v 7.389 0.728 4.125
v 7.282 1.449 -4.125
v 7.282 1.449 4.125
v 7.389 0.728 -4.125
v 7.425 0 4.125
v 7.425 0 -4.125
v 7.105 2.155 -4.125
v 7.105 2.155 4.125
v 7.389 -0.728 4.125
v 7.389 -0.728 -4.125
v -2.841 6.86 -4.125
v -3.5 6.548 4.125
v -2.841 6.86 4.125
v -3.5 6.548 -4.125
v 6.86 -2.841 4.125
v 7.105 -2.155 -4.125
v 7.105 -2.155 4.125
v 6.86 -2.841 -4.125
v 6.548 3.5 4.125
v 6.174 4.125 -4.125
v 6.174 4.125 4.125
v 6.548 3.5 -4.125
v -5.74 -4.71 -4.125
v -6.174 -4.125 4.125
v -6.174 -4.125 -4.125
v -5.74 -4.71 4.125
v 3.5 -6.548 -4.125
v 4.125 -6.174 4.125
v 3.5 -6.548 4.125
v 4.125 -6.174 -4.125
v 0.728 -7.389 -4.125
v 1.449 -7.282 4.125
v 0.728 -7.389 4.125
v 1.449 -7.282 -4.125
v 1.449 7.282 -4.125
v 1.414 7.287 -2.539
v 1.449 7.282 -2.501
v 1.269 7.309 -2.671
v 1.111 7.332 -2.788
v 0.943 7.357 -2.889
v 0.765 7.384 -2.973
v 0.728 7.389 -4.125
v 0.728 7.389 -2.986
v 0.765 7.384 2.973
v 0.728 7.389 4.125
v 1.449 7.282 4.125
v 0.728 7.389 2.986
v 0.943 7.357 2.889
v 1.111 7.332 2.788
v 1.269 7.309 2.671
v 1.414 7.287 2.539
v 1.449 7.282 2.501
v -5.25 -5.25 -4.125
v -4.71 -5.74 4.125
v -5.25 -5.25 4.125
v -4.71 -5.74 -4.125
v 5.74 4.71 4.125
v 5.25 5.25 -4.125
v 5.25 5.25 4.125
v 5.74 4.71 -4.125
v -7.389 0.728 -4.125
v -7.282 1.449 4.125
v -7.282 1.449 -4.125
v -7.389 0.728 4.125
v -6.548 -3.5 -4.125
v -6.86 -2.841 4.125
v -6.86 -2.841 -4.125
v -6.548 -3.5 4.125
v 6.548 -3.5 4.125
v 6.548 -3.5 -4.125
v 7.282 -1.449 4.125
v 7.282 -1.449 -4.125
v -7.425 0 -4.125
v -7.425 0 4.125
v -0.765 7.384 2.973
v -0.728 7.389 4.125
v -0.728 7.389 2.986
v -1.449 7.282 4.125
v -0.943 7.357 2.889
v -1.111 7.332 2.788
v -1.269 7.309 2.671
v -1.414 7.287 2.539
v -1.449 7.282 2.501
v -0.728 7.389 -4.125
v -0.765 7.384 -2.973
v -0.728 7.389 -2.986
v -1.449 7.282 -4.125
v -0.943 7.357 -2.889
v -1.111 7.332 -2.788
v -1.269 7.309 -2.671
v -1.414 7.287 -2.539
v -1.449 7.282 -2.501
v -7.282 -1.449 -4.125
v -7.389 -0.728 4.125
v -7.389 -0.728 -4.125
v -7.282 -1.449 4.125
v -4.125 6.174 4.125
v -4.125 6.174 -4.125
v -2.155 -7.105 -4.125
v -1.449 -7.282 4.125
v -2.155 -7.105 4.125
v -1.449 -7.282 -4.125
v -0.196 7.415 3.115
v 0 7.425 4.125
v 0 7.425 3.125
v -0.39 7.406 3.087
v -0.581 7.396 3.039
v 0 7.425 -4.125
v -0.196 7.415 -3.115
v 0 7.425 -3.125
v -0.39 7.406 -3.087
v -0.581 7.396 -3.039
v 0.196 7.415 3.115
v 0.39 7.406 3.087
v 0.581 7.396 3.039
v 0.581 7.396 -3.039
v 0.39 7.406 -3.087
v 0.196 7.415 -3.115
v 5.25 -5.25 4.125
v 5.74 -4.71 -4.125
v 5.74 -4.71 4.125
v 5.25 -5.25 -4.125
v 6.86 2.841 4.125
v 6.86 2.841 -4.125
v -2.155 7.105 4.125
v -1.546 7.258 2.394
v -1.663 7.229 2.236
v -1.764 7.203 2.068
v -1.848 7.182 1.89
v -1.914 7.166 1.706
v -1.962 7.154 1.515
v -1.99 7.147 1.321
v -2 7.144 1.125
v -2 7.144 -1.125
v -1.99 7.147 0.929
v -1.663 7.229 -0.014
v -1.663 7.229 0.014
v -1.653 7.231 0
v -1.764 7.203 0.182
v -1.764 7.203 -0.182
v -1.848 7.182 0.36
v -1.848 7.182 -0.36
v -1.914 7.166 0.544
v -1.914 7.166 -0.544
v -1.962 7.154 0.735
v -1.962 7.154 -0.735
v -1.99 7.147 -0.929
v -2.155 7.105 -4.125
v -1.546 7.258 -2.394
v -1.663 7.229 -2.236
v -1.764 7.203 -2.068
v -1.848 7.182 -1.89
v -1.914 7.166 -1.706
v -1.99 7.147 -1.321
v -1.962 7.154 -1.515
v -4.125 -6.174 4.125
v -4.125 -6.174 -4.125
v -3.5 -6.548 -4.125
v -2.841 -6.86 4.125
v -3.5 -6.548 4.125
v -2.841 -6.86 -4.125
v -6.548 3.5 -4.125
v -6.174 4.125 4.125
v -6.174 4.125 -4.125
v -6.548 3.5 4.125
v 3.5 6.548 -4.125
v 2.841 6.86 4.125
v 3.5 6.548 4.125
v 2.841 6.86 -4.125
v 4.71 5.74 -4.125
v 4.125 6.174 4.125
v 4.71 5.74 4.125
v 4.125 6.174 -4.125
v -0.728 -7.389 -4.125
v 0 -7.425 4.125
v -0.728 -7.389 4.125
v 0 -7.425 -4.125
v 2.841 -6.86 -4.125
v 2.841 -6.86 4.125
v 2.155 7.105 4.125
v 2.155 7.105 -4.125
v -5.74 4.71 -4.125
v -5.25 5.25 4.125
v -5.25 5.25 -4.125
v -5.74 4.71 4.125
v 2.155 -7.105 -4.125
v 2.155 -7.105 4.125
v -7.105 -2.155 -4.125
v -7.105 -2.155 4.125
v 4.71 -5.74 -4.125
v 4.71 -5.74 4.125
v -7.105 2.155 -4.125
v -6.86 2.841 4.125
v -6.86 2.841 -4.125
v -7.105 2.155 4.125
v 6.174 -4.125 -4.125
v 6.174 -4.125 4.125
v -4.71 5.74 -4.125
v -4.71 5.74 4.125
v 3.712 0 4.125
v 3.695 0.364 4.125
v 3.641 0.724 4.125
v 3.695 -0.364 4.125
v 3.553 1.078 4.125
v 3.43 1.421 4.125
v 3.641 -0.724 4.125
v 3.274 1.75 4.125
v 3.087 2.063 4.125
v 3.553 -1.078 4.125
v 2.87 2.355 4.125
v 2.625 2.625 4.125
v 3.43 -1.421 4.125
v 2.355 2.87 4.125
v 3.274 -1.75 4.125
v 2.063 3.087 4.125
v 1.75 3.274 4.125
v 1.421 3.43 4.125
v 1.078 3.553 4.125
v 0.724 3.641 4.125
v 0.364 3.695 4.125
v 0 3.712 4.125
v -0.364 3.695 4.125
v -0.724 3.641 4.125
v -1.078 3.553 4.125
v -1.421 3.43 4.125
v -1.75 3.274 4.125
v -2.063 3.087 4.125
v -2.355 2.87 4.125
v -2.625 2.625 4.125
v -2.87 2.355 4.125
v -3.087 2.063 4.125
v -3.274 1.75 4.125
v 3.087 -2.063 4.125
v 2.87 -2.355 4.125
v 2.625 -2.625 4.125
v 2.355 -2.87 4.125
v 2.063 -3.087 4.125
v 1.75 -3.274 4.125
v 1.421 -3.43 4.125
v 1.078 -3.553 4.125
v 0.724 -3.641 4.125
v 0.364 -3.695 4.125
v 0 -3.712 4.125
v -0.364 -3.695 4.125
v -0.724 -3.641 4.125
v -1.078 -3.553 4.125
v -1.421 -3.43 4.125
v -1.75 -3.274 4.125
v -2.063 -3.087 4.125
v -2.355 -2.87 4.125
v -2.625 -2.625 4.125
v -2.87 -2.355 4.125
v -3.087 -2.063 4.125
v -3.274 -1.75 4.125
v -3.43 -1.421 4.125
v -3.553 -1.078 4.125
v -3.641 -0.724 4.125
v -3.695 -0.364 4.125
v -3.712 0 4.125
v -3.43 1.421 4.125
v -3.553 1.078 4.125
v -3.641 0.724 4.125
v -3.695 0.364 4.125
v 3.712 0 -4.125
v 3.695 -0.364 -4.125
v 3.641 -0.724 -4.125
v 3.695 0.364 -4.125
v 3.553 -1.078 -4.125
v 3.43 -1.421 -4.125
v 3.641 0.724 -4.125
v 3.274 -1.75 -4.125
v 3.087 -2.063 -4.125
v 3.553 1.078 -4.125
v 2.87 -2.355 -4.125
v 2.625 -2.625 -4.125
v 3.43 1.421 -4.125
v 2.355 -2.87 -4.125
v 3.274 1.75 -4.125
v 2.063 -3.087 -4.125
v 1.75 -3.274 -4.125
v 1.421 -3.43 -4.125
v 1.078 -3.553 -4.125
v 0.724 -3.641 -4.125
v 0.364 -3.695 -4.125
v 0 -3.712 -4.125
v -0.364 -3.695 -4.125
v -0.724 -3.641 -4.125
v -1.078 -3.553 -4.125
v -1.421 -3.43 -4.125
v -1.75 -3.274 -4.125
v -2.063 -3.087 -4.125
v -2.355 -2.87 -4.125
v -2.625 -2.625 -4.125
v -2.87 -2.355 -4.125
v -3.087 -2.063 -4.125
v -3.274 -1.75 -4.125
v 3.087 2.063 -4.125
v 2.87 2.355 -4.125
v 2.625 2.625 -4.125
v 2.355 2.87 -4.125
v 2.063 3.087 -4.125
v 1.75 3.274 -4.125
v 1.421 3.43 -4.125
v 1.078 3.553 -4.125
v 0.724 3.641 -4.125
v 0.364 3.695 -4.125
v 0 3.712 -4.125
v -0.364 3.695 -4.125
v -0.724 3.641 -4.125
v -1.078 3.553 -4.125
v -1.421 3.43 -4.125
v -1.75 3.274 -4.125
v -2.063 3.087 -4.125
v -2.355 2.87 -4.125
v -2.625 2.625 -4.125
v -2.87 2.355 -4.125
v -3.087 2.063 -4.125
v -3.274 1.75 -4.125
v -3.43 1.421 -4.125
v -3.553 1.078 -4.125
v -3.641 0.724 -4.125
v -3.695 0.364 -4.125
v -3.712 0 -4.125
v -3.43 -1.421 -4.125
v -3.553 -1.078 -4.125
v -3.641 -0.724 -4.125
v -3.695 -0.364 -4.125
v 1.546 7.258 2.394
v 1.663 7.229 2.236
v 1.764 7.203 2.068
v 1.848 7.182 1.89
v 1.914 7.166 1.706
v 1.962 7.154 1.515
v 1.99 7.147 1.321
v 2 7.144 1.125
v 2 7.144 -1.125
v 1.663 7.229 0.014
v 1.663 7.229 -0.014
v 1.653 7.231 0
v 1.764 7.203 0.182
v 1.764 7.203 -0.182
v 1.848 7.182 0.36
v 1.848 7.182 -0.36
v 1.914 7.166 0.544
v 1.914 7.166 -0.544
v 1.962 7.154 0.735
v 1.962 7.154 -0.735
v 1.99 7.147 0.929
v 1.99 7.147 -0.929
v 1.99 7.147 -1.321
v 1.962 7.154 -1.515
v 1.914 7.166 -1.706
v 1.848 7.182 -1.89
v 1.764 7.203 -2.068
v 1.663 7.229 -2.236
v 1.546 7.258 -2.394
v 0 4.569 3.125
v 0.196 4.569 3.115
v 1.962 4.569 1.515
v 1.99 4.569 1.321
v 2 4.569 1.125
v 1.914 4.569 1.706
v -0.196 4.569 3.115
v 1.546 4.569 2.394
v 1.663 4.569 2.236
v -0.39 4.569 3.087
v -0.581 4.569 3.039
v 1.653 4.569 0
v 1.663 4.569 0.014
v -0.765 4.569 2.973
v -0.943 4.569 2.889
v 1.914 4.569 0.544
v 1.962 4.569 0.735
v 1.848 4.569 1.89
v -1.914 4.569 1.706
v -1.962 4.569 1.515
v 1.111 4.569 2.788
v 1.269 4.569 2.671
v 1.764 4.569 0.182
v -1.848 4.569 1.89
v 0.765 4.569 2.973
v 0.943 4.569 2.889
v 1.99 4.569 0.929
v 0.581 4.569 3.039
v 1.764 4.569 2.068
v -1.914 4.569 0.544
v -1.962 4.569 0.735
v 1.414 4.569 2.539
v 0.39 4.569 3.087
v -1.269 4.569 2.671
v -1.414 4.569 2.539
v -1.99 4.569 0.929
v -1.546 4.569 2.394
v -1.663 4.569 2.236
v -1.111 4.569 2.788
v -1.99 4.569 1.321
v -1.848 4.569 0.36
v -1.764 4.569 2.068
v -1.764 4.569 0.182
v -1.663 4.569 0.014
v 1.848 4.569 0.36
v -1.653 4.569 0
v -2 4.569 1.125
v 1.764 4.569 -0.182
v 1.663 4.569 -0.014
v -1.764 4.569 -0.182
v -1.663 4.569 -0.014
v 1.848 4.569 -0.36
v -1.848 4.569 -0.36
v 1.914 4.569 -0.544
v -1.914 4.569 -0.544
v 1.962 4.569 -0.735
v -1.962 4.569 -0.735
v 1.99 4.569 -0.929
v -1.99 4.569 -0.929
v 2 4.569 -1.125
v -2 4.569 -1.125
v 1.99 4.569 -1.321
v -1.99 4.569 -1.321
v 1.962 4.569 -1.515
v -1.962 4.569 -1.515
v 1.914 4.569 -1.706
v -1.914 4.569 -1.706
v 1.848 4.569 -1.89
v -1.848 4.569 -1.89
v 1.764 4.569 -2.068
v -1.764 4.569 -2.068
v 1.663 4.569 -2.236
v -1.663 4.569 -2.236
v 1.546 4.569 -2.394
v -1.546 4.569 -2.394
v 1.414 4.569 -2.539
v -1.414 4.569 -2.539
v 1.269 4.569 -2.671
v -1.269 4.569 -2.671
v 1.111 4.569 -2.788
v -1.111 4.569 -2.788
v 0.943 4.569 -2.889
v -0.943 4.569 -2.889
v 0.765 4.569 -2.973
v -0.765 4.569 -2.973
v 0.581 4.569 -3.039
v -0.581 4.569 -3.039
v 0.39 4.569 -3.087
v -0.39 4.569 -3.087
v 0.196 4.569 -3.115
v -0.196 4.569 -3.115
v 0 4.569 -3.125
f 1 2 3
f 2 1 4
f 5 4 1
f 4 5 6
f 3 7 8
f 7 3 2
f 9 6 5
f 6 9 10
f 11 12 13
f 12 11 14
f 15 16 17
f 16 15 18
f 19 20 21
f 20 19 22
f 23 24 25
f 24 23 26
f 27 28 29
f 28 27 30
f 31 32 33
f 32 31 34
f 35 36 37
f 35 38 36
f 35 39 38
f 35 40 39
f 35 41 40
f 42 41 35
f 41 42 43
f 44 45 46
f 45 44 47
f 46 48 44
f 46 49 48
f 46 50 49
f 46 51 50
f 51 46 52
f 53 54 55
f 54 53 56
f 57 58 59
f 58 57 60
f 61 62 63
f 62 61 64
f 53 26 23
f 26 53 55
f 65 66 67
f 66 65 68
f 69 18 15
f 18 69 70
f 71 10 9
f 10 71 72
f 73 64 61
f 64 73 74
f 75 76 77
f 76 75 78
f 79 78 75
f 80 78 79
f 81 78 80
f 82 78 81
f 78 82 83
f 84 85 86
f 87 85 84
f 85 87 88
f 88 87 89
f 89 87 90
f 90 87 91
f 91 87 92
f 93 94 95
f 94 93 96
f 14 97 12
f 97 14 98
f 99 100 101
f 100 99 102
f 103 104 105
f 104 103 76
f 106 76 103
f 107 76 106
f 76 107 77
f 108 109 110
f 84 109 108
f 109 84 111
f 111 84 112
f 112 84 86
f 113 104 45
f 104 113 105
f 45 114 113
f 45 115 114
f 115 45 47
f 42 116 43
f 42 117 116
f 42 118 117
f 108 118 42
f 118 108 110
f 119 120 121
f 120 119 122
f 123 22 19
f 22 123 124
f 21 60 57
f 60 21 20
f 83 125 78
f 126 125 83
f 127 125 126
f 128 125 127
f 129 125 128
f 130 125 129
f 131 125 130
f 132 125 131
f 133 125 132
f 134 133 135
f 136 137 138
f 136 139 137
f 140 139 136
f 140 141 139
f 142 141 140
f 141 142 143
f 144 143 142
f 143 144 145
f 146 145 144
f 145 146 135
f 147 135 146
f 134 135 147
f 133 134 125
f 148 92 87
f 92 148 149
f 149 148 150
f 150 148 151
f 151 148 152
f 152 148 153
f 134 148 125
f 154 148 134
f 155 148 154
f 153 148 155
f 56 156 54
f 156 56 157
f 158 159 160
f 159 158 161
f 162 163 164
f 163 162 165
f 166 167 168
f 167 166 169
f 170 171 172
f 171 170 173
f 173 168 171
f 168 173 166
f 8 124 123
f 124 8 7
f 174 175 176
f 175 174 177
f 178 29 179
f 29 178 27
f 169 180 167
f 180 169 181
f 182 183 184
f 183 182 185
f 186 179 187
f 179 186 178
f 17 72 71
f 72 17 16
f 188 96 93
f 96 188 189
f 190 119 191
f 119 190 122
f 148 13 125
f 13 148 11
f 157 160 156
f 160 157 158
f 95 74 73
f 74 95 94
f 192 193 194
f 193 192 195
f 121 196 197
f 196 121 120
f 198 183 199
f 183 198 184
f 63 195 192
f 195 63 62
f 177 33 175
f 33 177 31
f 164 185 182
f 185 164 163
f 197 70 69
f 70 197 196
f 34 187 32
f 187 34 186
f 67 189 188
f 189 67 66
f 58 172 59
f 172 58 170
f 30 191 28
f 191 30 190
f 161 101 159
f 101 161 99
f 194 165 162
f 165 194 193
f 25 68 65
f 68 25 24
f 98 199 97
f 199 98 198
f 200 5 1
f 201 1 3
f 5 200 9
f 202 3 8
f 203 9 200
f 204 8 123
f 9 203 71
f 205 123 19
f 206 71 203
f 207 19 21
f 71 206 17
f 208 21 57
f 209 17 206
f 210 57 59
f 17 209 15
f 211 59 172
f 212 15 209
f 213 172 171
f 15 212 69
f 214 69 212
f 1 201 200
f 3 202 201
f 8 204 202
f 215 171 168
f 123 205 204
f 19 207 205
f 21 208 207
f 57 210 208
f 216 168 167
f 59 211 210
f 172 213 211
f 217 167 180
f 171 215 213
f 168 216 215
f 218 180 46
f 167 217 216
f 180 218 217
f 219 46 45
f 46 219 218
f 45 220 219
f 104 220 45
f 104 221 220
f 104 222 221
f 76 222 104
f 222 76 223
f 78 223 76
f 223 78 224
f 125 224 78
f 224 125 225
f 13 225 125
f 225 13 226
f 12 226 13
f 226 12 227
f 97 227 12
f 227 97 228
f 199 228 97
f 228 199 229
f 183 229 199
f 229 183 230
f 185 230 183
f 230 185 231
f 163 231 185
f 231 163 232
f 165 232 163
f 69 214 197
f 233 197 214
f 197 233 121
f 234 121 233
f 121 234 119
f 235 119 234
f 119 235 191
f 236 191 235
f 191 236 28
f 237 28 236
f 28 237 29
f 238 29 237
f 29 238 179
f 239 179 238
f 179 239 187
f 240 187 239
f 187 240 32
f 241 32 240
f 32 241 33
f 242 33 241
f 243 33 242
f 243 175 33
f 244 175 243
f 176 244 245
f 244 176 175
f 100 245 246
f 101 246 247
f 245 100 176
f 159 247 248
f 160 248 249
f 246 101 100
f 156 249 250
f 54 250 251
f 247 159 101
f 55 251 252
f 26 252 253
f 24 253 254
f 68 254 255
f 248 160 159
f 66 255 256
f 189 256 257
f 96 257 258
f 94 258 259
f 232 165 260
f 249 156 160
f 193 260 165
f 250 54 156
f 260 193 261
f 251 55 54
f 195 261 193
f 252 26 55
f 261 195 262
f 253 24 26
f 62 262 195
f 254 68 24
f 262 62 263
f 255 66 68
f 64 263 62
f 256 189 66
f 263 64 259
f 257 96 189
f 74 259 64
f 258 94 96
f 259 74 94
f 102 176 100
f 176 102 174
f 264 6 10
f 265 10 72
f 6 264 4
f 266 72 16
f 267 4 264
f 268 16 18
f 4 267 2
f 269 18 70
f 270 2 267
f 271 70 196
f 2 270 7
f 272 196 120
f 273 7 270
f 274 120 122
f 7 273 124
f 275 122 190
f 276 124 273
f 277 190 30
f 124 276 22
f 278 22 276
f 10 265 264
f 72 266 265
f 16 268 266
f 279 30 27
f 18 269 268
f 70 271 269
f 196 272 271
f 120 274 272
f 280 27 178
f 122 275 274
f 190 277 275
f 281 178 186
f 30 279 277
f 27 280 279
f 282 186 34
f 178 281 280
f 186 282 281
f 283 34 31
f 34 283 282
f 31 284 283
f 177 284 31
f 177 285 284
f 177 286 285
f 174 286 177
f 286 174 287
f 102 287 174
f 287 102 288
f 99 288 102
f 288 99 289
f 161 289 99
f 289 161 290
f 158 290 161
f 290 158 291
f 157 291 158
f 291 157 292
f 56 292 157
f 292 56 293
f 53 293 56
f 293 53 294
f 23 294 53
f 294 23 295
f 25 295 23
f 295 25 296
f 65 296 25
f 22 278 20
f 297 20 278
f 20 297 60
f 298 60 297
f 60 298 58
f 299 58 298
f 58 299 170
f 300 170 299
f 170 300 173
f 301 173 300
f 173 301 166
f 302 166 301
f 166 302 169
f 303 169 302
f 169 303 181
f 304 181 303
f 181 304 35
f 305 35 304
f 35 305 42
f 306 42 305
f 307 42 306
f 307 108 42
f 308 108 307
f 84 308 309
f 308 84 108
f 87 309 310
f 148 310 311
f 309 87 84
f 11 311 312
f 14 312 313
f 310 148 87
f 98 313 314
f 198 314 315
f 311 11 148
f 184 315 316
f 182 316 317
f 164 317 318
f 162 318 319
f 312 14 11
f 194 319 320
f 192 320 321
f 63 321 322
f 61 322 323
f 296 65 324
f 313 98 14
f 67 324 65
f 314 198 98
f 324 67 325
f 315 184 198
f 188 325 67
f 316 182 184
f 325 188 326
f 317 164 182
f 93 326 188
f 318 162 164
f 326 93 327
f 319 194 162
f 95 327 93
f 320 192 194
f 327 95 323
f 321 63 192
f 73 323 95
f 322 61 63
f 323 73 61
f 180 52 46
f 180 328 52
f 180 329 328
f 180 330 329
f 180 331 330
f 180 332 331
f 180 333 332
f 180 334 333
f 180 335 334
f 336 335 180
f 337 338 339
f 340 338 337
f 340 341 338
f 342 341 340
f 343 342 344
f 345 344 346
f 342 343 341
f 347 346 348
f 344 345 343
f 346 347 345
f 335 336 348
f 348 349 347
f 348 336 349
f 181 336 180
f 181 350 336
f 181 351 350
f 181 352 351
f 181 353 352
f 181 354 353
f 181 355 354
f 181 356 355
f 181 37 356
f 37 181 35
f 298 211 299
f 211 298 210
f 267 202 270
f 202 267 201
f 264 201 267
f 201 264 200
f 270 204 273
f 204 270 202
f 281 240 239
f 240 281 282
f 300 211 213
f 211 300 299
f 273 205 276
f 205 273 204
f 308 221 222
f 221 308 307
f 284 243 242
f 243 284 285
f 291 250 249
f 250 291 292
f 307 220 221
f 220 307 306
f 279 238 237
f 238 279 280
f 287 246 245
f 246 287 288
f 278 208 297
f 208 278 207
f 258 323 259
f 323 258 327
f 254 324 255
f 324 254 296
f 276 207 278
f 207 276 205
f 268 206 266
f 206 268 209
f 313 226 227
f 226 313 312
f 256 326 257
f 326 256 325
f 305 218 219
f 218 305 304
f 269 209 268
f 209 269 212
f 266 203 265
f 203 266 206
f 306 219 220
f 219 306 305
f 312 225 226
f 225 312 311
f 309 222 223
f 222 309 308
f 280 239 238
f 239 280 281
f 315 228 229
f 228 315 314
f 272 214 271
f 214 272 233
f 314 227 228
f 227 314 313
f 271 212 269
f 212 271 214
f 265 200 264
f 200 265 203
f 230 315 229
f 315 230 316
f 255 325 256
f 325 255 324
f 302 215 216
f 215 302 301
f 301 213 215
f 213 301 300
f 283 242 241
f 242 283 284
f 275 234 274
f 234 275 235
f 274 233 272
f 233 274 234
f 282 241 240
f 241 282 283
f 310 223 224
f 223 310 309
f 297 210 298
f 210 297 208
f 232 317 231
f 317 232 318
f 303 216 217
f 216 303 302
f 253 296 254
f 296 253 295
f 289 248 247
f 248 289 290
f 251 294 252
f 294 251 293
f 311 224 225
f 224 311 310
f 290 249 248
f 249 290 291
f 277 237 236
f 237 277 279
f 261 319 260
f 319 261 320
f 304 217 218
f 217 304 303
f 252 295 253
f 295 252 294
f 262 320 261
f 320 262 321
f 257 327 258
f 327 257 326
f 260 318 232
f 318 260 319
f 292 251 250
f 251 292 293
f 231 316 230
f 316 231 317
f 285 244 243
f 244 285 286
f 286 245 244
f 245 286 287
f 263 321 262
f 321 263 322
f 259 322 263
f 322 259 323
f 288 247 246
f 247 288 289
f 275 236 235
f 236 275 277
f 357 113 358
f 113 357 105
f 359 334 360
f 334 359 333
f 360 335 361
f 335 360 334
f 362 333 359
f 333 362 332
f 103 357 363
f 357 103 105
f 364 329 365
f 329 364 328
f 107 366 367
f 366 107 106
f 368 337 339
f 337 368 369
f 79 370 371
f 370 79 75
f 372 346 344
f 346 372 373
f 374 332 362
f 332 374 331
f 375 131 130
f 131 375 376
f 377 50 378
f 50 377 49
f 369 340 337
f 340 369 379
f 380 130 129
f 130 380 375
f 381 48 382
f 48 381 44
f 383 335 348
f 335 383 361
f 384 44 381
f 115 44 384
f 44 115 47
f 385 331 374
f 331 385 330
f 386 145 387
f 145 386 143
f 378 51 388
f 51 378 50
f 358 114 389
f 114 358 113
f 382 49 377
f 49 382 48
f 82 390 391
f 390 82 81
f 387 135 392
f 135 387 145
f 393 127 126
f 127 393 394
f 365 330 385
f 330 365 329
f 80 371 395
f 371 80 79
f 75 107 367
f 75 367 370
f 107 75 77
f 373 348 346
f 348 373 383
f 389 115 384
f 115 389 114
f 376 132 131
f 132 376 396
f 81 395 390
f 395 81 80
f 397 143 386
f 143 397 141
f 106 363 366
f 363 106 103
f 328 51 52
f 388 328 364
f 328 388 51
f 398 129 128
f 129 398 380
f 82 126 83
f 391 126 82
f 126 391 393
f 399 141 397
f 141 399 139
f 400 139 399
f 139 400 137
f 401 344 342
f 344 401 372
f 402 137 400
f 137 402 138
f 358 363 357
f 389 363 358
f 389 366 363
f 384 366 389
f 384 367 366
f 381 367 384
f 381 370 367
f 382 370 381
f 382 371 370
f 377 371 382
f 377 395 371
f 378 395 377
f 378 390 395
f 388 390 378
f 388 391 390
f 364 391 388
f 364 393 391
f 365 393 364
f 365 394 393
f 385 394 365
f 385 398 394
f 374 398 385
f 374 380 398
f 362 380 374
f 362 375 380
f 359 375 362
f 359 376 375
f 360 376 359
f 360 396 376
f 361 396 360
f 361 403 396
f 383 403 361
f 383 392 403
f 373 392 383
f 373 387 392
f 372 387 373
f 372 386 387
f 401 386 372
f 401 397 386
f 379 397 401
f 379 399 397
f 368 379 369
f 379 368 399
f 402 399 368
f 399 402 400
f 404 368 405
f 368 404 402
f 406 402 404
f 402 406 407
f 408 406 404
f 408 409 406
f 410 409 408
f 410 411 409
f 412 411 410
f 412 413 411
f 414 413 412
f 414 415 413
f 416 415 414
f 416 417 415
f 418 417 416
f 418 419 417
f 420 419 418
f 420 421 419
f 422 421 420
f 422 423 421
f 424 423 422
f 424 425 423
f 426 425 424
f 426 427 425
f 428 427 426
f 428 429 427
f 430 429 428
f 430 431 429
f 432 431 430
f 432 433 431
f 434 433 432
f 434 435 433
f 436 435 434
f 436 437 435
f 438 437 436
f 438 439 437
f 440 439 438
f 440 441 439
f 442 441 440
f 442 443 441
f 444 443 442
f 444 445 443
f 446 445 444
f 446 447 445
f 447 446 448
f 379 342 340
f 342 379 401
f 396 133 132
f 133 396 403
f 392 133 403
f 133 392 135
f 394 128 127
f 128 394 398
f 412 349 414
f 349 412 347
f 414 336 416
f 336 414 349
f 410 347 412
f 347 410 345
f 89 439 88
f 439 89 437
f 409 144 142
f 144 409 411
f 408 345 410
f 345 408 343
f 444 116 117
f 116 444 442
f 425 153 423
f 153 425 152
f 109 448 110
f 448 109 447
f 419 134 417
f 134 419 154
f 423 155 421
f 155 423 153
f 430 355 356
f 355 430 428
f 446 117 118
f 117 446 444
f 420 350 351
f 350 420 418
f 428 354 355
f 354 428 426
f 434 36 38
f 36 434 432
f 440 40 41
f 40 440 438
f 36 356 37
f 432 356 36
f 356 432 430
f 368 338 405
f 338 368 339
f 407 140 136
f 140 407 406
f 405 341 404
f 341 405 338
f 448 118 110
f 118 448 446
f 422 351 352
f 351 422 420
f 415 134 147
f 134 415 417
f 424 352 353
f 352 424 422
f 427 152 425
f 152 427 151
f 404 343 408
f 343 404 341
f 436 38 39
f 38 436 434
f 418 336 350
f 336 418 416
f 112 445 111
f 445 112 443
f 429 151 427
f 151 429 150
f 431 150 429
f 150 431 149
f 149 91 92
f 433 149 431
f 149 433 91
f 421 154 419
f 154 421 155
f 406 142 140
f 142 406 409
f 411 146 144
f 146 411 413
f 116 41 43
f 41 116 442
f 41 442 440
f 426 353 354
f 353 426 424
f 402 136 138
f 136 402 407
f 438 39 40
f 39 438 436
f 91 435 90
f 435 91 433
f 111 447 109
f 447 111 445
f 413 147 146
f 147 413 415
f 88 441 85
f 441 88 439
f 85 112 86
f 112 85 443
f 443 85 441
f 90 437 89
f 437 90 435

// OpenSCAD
// COBRA Vertebra - L2 V20
// Height: 8.25mm, OD: 14.850000000000001mm

$fn = 64;

difference() {
    // Outer cylinder
    cylinder(h=8.25, d=14.850000000000001, center=true);
    
    // Inner channel
    cylinder(h=10.25, d=7.425000000000001, center=true);

    // Pivot holes
    translate([0, 7.425000000000001, 1.125])
    rotate([90, 0, 0])
    cylinder(h=5.7125, d=4, center=true);
    
    translate([0, 7.425000000000001, -1.125])
    rotate([90, 0, 0])
    cylinder(h=5.7125, d=4, center=true);
}
